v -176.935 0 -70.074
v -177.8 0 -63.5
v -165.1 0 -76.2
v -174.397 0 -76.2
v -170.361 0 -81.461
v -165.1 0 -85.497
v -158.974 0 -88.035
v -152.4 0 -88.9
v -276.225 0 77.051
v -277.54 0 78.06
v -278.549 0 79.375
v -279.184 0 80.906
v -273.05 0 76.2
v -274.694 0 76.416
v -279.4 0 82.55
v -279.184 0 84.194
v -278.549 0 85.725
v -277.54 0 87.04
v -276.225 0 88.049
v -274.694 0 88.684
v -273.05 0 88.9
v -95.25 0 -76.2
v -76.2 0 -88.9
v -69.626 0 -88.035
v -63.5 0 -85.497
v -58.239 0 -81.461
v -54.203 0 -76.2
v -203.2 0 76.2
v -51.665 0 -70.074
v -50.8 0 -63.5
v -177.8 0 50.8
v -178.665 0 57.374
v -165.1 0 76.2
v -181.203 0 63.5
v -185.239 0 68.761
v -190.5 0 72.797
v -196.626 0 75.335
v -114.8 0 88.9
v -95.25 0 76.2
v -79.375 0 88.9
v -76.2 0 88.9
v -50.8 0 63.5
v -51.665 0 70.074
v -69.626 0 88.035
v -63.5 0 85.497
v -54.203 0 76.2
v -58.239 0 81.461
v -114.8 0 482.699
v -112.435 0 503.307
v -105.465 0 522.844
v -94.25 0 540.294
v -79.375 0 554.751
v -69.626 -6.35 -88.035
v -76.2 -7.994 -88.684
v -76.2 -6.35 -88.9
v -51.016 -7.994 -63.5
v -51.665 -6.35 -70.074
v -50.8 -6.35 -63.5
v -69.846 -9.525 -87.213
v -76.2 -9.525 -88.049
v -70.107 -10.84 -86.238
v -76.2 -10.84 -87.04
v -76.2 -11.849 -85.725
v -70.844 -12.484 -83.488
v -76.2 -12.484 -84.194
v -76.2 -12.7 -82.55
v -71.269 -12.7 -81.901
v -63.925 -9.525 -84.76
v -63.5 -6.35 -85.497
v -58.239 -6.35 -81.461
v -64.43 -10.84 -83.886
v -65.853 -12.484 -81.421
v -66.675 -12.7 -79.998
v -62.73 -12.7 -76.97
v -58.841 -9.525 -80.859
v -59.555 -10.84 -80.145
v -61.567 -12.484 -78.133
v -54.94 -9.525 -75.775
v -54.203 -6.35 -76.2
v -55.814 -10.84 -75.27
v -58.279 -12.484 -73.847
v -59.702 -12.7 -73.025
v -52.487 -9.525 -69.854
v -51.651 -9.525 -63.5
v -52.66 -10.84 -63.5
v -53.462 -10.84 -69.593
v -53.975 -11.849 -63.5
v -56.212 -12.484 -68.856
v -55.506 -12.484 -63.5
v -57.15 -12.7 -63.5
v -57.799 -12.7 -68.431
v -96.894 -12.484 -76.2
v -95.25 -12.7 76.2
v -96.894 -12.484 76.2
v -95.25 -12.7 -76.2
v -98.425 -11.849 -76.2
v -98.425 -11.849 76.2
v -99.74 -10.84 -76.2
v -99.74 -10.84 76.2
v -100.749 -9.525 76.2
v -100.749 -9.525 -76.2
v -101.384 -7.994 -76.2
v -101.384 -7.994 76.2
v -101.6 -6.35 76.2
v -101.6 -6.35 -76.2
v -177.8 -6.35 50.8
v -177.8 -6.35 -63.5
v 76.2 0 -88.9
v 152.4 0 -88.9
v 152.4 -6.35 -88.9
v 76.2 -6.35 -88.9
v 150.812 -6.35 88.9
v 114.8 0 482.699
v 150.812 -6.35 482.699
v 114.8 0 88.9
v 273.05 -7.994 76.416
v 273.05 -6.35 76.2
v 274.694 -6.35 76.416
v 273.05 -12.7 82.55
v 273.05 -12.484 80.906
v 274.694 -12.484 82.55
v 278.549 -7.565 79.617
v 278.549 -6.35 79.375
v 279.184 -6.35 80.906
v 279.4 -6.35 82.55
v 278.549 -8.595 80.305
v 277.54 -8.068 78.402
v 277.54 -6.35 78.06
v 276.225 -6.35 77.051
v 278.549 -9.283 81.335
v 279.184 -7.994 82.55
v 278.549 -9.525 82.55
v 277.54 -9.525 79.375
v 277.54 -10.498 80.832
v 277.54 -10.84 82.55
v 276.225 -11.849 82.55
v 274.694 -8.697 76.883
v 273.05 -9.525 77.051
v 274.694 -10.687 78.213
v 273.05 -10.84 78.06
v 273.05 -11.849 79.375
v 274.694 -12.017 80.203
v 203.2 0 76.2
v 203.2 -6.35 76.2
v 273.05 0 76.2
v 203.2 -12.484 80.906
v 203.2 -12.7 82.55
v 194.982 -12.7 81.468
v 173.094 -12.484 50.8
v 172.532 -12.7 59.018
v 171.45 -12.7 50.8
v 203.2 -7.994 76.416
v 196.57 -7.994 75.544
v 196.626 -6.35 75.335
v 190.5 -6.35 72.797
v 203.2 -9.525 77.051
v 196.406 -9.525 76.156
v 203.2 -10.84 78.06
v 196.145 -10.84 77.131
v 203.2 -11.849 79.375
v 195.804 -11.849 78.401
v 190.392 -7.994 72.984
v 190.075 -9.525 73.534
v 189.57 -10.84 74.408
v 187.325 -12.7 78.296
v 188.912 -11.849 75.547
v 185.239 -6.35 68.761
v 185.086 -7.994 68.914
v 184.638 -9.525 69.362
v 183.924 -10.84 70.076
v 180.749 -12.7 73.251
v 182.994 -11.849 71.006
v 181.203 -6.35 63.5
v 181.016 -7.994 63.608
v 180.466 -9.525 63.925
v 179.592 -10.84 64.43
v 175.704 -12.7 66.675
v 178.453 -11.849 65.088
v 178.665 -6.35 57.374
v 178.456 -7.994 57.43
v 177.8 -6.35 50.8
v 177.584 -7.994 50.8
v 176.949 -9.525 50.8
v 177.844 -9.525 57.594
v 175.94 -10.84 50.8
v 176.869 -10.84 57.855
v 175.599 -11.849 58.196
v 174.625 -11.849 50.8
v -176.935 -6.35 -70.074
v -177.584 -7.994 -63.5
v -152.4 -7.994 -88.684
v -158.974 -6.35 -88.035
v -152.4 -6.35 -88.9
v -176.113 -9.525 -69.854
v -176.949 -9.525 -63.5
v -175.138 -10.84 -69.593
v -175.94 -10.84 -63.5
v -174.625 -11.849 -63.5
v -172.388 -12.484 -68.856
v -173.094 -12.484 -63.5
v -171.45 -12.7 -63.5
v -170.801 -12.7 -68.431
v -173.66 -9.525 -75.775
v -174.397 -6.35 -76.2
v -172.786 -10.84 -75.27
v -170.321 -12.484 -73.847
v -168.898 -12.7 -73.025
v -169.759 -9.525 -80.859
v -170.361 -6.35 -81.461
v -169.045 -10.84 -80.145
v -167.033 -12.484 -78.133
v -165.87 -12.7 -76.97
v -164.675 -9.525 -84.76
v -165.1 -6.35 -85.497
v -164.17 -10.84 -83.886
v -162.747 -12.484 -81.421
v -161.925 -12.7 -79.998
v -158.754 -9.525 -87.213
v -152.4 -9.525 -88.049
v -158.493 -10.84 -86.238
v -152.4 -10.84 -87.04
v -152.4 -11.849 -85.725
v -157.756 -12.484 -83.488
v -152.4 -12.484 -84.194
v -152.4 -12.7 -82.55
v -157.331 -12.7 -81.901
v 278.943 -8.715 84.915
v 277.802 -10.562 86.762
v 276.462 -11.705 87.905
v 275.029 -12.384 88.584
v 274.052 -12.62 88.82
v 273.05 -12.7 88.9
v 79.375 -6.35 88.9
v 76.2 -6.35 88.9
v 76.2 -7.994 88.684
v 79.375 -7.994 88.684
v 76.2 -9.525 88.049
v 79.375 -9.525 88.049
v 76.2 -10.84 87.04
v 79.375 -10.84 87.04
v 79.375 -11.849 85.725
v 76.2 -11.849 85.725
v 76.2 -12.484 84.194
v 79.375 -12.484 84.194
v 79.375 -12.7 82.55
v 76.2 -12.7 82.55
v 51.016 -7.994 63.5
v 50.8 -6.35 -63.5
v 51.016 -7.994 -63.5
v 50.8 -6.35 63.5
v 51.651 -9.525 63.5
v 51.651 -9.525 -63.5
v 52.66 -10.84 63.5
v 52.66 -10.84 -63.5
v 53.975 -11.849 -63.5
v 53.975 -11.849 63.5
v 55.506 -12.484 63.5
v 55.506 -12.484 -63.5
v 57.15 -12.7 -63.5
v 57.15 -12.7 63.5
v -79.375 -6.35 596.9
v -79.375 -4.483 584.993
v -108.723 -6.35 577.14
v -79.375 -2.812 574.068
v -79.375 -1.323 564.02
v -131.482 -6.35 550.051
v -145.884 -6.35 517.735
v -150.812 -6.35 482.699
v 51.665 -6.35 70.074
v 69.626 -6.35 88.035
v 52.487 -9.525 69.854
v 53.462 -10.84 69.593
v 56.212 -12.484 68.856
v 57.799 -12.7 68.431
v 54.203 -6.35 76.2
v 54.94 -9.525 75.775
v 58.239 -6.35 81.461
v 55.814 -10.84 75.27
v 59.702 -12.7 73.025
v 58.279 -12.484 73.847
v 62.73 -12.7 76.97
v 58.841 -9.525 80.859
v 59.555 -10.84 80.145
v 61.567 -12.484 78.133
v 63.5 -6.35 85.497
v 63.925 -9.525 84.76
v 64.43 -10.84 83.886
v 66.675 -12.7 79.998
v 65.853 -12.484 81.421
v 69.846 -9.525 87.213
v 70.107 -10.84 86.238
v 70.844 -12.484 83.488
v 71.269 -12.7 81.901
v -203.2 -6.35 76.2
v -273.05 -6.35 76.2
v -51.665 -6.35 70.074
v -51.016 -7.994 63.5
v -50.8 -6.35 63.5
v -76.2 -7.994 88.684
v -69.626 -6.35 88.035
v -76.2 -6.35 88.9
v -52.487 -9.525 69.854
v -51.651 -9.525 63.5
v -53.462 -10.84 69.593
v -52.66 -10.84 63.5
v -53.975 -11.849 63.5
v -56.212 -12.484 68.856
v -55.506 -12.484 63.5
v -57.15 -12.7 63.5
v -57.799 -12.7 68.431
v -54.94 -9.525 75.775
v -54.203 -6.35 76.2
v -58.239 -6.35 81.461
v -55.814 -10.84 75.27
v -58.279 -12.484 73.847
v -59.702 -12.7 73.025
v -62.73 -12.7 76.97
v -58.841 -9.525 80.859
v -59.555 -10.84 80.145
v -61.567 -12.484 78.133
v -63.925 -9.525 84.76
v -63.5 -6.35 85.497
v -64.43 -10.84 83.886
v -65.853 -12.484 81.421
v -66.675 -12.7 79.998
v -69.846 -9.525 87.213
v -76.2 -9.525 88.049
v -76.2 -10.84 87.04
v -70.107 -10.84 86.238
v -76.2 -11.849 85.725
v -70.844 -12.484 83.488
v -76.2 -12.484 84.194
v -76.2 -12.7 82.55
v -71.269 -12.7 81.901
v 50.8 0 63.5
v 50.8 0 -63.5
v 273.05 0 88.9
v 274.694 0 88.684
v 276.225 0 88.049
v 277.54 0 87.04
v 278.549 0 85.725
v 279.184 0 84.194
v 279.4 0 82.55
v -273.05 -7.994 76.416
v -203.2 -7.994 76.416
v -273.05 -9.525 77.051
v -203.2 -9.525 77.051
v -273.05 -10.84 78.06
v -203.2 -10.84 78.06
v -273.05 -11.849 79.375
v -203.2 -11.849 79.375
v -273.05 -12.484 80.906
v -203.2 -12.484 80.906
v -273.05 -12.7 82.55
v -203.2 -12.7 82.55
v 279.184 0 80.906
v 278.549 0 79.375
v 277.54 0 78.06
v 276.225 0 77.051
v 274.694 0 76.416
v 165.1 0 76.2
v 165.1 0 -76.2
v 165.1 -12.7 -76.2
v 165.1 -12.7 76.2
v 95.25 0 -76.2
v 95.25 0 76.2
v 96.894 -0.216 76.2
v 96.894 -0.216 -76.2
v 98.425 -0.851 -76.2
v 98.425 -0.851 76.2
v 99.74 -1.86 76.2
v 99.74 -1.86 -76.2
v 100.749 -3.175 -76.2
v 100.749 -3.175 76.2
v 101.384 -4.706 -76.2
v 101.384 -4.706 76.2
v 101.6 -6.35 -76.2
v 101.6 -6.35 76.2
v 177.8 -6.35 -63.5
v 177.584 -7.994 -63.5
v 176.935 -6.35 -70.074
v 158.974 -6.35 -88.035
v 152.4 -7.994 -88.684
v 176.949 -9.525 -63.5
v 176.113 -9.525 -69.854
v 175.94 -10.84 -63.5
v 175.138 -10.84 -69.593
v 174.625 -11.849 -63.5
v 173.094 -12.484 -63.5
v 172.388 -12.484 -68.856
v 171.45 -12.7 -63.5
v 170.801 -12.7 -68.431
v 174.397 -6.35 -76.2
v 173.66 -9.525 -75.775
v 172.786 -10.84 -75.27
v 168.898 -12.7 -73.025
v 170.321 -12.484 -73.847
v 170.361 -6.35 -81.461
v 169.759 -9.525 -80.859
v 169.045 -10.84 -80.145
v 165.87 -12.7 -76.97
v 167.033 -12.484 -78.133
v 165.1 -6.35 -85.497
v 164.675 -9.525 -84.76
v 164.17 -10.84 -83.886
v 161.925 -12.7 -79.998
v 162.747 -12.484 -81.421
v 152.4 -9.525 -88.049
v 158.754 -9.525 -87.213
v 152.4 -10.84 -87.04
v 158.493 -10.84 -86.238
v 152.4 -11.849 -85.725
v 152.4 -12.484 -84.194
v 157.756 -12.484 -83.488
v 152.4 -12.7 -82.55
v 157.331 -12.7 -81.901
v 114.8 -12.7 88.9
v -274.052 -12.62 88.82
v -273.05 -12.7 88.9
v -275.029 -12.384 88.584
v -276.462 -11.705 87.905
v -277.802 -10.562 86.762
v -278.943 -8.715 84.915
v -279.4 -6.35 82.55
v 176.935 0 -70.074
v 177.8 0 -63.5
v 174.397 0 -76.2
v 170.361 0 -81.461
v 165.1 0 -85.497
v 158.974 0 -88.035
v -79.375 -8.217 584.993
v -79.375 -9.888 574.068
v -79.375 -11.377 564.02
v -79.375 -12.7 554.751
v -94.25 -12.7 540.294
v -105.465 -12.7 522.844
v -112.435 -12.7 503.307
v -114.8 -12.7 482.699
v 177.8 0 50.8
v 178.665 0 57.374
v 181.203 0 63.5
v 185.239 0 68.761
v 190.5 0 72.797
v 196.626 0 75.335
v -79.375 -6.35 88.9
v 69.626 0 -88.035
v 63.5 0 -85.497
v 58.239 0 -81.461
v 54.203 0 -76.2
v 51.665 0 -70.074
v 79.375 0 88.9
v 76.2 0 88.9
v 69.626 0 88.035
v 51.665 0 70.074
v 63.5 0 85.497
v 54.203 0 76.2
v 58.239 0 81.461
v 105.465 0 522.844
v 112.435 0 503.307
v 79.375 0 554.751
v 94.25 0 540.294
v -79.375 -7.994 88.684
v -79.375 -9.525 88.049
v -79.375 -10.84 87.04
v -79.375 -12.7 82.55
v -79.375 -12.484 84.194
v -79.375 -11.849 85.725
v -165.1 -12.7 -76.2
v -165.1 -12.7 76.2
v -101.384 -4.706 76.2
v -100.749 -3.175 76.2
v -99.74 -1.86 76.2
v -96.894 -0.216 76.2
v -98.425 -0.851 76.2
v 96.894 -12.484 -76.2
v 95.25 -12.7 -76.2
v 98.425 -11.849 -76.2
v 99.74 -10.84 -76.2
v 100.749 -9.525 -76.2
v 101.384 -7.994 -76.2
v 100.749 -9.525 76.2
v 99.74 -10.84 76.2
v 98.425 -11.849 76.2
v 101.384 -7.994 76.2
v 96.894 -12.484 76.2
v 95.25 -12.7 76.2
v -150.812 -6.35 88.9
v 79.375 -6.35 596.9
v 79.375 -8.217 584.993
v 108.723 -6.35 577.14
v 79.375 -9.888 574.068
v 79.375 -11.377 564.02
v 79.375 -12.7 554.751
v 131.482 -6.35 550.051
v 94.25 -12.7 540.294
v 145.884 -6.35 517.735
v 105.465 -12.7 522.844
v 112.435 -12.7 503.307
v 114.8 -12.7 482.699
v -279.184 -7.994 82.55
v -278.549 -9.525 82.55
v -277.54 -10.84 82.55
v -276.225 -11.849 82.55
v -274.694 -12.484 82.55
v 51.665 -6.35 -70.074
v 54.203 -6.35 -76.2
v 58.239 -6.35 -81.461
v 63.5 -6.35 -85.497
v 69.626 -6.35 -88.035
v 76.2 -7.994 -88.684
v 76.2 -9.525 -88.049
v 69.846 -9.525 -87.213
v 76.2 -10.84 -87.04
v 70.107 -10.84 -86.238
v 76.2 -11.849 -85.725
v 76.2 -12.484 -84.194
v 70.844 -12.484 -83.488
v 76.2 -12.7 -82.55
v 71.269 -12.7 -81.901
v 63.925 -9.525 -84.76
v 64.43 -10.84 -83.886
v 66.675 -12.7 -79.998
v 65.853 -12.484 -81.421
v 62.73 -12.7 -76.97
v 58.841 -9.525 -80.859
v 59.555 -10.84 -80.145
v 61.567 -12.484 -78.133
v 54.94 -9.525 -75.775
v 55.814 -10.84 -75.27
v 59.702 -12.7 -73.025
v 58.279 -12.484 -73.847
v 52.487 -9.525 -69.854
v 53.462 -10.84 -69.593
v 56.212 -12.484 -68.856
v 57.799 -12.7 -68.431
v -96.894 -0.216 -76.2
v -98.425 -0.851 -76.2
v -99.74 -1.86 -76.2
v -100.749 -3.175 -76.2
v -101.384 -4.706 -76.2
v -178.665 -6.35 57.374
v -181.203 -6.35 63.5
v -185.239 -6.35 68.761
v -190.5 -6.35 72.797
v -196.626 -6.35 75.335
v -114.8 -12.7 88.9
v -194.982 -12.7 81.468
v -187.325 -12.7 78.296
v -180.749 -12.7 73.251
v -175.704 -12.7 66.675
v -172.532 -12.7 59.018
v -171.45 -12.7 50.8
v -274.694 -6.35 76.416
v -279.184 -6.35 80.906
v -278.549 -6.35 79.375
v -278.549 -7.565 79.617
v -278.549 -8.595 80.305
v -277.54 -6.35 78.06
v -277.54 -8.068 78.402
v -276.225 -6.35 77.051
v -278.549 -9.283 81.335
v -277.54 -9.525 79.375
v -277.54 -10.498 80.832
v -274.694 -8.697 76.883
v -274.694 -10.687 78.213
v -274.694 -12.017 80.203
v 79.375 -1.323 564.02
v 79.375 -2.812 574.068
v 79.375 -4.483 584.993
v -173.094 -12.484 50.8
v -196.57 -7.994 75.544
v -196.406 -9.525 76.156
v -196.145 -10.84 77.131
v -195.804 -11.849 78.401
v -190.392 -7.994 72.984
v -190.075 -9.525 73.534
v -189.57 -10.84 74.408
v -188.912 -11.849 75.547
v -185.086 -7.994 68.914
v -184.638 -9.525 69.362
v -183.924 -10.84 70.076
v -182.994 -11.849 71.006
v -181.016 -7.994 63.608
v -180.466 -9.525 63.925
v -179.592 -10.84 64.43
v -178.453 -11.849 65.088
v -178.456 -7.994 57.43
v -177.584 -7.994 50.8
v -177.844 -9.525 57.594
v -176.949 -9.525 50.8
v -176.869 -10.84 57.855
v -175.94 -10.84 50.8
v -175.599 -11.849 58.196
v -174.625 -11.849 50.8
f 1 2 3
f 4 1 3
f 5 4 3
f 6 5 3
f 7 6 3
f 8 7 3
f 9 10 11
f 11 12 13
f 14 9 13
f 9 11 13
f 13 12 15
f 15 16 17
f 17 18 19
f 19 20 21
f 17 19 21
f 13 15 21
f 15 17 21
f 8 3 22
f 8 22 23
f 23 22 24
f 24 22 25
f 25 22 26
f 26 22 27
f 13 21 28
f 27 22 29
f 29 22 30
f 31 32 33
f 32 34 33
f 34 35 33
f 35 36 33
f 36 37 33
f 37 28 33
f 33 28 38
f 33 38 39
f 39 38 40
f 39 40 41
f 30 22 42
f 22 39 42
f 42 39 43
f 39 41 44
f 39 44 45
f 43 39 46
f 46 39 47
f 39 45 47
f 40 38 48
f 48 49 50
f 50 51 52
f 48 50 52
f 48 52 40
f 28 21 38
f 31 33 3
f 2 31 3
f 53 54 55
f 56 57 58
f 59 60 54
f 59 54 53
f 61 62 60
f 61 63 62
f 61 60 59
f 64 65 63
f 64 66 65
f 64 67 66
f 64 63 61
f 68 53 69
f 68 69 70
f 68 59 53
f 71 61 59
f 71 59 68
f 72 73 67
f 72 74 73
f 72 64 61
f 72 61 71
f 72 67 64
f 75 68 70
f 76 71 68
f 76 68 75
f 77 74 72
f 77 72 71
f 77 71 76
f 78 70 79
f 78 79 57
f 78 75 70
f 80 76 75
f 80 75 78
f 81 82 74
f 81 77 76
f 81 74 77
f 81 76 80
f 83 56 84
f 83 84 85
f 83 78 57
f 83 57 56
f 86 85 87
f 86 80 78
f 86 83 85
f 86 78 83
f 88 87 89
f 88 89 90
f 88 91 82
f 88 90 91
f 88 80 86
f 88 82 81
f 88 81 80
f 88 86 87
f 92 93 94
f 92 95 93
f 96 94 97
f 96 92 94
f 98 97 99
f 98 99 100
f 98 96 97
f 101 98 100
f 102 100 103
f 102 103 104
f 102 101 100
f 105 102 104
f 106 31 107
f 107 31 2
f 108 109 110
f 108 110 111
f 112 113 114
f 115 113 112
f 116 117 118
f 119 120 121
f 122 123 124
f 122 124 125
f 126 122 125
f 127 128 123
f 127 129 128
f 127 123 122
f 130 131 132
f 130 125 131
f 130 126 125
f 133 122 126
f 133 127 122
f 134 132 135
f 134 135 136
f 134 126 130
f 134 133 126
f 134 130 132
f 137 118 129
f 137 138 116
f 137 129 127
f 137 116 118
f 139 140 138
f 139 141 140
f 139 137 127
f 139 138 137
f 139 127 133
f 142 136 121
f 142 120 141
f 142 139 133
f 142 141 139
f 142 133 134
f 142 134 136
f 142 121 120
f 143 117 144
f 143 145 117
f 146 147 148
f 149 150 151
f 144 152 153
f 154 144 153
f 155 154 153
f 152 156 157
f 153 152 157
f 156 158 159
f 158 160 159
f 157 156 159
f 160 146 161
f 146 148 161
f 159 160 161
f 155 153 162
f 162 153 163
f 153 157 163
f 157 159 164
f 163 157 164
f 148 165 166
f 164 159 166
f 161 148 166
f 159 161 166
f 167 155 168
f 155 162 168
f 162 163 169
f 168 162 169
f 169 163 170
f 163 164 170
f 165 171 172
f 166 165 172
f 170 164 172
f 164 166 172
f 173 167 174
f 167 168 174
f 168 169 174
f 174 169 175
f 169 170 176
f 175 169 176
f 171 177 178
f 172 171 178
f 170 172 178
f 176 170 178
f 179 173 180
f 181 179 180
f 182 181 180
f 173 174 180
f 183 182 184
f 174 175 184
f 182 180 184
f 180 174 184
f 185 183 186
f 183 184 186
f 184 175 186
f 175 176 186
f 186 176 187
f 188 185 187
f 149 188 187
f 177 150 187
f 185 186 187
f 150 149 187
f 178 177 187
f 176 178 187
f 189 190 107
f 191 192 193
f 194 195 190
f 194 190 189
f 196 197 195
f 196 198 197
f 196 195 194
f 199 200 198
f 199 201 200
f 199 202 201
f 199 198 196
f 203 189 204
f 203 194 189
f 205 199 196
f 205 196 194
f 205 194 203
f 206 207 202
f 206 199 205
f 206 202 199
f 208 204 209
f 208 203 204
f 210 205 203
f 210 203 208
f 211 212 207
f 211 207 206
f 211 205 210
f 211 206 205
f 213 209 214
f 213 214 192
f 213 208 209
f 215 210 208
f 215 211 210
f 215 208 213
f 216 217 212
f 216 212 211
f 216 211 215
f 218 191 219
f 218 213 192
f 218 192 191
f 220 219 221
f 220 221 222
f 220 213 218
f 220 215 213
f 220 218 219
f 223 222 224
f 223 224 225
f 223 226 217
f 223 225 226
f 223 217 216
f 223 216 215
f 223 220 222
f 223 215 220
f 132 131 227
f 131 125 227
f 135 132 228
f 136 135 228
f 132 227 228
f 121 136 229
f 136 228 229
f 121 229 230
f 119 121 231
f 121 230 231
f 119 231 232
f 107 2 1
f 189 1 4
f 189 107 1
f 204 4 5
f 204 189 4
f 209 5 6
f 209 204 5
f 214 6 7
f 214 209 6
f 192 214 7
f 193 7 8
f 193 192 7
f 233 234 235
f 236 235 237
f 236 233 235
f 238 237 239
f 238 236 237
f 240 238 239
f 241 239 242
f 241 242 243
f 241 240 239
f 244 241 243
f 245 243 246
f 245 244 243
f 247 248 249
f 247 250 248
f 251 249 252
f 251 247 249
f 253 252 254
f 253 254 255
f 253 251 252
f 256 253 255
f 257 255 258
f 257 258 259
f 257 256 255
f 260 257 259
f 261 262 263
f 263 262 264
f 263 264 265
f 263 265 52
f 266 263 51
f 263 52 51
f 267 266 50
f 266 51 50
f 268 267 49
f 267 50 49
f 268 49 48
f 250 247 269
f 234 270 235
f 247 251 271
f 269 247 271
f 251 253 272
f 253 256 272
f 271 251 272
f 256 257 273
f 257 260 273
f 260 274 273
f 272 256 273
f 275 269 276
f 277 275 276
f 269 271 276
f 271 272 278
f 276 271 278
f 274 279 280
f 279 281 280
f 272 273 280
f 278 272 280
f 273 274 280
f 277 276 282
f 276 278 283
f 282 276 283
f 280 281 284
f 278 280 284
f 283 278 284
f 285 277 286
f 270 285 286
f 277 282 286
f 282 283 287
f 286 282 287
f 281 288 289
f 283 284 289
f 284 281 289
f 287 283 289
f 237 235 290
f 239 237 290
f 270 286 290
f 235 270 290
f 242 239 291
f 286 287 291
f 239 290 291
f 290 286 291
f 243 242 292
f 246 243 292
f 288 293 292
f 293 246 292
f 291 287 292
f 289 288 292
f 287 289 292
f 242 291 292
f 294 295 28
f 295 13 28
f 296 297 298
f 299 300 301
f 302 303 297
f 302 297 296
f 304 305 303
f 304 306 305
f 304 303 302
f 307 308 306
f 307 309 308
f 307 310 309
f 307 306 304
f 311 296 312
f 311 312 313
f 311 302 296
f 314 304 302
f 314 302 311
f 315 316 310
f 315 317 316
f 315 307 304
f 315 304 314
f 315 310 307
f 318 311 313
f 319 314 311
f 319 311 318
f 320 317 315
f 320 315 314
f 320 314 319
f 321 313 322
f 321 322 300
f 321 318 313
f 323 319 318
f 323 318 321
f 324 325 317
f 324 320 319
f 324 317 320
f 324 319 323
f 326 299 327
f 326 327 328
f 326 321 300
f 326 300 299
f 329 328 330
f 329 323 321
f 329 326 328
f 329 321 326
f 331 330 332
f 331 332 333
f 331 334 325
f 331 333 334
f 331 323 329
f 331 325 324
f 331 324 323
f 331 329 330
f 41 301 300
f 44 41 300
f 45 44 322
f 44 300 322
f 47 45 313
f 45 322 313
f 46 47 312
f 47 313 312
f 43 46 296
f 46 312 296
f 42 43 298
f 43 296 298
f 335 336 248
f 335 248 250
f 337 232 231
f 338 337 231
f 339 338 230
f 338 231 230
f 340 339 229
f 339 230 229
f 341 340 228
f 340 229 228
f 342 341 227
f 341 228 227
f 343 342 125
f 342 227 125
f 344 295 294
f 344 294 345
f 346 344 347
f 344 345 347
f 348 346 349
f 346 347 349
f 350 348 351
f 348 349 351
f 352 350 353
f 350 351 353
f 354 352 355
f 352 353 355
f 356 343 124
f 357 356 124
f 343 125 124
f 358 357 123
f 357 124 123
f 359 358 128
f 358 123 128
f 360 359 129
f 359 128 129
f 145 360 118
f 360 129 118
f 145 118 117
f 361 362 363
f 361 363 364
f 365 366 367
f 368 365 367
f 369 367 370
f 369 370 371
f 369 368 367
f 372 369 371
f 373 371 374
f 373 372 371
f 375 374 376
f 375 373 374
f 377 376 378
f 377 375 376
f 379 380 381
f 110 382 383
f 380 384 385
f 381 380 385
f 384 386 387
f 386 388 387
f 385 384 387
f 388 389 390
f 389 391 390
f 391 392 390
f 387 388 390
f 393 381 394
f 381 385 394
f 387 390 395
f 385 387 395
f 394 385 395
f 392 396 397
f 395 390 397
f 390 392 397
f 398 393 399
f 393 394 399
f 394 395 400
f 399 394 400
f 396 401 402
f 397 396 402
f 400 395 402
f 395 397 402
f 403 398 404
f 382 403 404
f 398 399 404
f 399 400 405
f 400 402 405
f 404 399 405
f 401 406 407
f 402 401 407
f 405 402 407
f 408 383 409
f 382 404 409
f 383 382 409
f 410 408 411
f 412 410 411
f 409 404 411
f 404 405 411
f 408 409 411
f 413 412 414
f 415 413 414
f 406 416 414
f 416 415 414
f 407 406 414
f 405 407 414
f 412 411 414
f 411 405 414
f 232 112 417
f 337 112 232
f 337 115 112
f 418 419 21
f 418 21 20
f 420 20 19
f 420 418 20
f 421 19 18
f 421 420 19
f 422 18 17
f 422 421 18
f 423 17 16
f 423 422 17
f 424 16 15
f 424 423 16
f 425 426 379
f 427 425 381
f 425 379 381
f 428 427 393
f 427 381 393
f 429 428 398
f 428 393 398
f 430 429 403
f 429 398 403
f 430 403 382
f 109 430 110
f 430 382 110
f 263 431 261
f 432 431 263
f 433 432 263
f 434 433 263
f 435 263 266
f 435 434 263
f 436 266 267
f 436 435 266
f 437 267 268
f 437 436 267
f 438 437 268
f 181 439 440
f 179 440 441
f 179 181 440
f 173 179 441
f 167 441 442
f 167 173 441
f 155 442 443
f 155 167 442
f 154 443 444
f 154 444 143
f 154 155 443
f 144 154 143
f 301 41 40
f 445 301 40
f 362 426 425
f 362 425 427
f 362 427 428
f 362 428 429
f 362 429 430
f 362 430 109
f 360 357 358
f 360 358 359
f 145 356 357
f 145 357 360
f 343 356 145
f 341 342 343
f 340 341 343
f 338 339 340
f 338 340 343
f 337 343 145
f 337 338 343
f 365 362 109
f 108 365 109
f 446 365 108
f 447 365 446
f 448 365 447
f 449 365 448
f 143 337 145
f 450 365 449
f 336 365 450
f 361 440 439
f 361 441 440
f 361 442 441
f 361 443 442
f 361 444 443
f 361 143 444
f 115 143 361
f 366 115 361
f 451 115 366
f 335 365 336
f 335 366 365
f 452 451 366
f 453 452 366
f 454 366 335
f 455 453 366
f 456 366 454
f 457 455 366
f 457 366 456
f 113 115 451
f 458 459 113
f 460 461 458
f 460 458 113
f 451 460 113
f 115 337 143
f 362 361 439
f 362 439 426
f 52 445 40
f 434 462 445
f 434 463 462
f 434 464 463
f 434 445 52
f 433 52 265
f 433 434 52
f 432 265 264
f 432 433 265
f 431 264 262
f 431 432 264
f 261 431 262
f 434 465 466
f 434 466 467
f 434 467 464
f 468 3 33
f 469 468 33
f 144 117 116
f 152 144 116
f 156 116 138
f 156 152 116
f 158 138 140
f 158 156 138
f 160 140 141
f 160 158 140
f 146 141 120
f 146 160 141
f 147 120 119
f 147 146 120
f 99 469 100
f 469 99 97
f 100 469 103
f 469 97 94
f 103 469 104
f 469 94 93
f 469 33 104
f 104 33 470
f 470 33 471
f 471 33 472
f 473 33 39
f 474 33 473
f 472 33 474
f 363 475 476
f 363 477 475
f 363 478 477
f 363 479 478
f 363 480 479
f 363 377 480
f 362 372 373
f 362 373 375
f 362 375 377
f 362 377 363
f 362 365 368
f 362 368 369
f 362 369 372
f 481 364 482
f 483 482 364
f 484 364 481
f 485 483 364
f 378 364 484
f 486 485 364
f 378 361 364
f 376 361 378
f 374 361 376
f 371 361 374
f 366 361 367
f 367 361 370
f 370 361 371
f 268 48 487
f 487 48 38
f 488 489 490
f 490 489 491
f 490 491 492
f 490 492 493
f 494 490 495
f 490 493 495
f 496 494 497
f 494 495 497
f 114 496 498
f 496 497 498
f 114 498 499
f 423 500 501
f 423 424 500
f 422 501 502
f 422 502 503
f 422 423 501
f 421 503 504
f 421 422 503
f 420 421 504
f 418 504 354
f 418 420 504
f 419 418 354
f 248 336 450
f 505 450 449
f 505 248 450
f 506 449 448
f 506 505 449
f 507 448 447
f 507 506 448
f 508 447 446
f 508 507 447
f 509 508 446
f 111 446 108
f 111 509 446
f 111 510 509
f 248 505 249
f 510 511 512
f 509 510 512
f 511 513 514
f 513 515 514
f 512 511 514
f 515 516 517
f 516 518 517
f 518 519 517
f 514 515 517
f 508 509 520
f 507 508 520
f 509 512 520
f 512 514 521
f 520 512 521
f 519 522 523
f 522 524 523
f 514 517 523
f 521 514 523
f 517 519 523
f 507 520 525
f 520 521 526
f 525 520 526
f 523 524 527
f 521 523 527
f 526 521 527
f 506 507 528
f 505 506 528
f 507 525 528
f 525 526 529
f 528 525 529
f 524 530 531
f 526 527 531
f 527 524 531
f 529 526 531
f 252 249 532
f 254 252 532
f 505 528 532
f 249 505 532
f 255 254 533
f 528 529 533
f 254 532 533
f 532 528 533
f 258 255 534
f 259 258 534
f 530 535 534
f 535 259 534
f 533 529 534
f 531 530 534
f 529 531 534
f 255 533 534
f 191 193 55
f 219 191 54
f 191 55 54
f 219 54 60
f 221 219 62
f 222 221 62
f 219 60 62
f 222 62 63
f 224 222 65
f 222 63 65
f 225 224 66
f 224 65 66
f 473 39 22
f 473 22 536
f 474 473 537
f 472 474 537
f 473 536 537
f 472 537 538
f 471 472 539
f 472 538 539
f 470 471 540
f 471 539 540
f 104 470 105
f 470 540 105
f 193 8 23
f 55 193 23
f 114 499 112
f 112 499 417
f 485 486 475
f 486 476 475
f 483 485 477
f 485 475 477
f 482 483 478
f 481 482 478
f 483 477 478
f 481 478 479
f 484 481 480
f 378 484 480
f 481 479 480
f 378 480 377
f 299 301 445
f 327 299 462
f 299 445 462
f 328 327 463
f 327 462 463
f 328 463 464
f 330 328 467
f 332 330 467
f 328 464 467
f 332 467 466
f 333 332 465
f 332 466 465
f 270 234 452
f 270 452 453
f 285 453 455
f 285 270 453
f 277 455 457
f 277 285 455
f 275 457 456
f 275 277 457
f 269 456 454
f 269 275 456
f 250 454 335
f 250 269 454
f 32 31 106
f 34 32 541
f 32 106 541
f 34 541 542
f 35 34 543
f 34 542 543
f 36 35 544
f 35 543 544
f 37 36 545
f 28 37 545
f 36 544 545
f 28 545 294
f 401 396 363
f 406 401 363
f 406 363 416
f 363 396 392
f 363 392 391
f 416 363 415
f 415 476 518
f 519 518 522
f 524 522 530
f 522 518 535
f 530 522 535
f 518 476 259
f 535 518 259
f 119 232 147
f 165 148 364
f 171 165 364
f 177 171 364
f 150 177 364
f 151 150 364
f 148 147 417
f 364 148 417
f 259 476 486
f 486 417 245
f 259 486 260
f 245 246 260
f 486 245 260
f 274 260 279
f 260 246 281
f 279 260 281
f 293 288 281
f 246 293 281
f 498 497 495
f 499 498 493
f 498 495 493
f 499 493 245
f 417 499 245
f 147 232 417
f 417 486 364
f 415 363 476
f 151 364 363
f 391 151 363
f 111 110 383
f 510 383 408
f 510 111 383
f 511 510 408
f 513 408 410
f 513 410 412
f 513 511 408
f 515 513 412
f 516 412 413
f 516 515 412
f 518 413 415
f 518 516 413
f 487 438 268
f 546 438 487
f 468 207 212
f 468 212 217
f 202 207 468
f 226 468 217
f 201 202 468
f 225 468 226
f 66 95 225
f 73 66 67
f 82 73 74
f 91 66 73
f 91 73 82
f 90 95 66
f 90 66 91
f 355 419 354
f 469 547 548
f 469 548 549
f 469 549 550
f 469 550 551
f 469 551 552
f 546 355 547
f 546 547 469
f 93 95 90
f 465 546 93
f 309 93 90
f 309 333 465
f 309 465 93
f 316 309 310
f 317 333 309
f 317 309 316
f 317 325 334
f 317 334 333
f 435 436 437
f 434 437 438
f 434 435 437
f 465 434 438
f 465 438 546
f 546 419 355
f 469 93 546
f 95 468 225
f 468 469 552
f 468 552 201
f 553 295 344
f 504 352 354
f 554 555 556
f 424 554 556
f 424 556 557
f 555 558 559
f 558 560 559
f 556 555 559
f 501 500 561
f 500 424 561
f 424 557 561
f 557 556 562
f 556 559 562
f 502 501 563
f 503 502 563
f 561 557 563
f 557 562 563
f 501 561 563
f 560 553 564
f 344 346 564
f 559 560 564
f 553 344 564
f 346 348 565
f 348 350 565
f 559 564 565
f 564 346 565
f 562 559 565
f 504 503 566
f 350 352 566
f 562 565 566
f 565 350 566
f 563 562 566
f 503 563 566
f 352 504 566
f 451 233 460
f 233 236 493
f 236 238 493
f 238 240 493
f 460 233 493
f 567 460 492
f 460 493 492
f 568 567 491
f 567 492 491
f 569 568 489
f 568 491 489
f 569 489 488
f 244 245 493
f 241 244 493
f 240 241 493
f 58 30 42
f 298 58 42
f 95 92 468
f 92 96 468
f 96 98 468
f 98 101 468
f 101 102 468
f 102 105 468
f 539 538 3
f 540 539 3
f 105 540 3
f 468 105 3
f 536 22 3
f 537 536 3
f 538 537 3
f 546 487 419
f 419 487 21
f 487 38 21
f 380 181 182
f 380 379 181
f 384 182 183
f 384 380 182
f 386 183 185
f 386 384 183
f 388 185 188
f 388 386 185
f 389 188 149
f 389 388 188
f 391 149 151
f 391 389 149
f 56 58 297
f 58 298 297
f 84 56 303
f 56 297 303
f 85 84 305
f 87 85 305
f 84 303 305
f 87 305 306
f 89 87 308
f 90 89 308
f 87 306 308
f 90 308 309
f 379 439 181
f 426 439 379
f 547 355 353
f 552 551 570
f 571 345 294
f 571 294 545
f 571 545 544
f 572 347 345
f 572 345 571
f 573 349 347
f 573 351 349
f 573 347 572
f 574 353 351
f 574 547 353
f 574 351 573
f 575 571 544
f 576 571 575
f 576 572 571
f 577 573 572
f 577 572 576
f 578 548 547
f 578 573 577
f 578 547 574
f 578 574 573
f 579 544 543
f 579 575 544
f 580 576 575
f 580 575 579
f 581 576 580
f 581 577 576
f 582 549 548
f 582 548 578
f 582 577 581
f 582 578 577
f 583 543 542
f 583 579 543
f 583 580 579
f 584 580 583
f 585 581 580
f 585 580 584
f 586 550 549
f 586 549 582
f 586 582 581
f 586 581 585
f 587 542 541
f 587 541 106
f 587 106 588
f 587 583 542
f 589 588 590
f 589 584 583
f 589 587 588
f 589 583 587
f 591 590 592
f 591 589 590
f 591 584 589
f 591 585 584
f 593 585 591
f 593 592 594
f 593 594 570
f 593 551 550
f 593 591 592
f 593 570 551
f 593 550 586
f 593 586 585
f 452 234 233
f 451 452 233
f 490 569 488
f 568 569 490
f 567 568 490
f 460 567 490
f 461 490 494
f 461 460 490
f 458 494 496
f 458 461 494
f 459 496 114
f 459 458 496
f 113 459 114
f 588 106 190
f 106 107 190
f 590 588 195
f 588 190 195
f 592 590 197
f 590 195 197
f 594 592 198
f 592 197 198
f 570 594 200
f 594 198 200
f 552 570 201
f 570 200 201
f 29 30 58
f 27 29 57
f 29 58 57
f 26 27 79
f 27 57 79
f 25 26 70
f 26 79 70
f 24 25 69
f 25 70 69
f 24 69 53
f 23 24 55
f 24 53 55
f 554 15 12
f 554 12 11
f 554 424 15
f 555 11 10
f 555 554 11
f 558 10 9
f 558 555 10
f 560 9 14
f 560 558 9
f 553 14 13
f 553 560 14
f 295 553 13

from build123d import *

# Parameters (mm, degrees)
F0_W        = 101.6
F0_H        = 12.7
F1_DEPTH    = 12.7
F3_DEPTH    = 12.7
F4_T1_DEPTH = 583.7036907444
F5_R        = 6.34999
F6_R        = 25.4
F7_R        = 6.35
F8_R        = 6.34999
F9_SIZE2    = 36.01263
F9_SIZE     = 6.34999


# Not quite as in the source:
# - a fillet or chamfer that OpenCascade refuses, or shapes differently, is made with other operations: its cross-section is extruded or revolved along the edge and cut away or added
# - a fillet or chamfer is up to 0.001 mm smaller than in the source, because OpenCascade refuses the exact size


with BuildPart() as f1:
    # F0 (on Front) → F1 (new body)
    with BuildSketch(Plane.XZ):
        Polygon((-50.8, -88.9), (-50.8, -76.2), (-101.6, -76.2), (-165.1, -76.2), (-165.1, 76.2), (-177.8, 76.2), (-177.8, -88.9), align=None)
        Polygon((-101.6, -76.2), (-50.8, -76.2), (-50.8, 0), (-50.8, 76.2), (-101.6, 76.2), align=None)
        Polygon((-165.1, 76.2), (-101.6, 76.2), (-50.8, 76.2), (-50.8, 88.9), (-177.8, 88.9), (-177.8, 76.2), align=None)
        with Locations((-228.6, 82.55)):
            Rectangle(F0_W, F0_H)
    extrude(amount=F1_DEPTH)

    # F2 (on face) → F3 (join)
    with BuildSketch(Plane.XZ.offset(12.7)):
        Polygon((-107.95, 88.9), (-79.375, 88.9), (-79.375, 596.9), (-150.8125, 596.9), (-150.8125, 88.9), (-136.525, 88.9), align=None)
    extrude(amount=-F3_DEPTH)

    # F4: fillet of radius 127 on 1 edges, made by hand

    # F4_s2 → F4_t1 (cut)
    with BuildSketch(Plane.XZ.offset(-285.5018453722)):
        with BuildLine():
            ThreePointArc((-79.375, 596.9), (-131.4819884821, 550.0511827591), (-150.8125, 482.6992618511))
            Line((-150.8125, 482.6992618511), (-150.8125, 596.9))
            Line((-150.8125, 596.9), (-79.375, 596.9))
        make_face()
    extrude(amount=F4_T1_DEPTH, mode=Mode.SUBTRACT)

    # F5 (radius 6.35 in the source; OpenCascade refuses exactly that, so slightly less here)
    f5_edges = [f1.edges().sort_by_distance(p)[0] for p in [
        (-101.6, -12.7, 0),
        (-101.6, 0, 0),
    ]]
    fillet(f5_edges, radius=F5_R)

    # F6
    f6_edges = [f1.edges().sort_by_distance(p)[0] for p in [
        (-50.8, -6.35, 88.9),
        (-50.8, -6.35, -88.9),
        (-177.8, -6.35, -88.9),
        (-177.8, -6.35, 76.2),
    ]]
    fillet(f6_edges, radius=F6_R)

    # F7
    f7_edges = [f1.edges().sort_by_distance(p)[0] for p in [
        (-50.8, -12.7, 0),
    ]]
    fillet(f7_edges, radius=F7_R)

    # F8 (radius 6.35 in the source; OpenCascade refuses exactly that, so slightly less here)
    f8_edges = [f1.edges().sort_by_distance(p)[0] for p in [
        (-279.4, -12.7, 85.725),
        (-279.4, -6.35, 88.9),
        (-279.4, -3.175, 76.2),
        (-279.4, -10.840128, 78.059872),
    ]]
    fillet(f8_edges, radius=F8_R)

    # F9 (size 6.35 and 36.0126395546 in the source; OpenCascade refuses exactly that, so slightly less here)
    f9_edges = [f1.edges().sort_by_distance(p)[0] for p in [
        (-150.8125, -12.7, 285.799631),
        (-150.8125, 0, 285.799631),
    ]]
    f9_side = f1.faces().sort_by_distance((-150.8125, -6.35, 285.799631))[0]
    chamfer(f9_edges, length=F9_SIZE, length2=F9_SIZE2, reference=f9_side)


with BuildPart() as f10_1:
    # F10: instance of F1
    add(f1.part.mirror(Plane.YZ))


solid = Compound([f1.part, f10_1.part])
